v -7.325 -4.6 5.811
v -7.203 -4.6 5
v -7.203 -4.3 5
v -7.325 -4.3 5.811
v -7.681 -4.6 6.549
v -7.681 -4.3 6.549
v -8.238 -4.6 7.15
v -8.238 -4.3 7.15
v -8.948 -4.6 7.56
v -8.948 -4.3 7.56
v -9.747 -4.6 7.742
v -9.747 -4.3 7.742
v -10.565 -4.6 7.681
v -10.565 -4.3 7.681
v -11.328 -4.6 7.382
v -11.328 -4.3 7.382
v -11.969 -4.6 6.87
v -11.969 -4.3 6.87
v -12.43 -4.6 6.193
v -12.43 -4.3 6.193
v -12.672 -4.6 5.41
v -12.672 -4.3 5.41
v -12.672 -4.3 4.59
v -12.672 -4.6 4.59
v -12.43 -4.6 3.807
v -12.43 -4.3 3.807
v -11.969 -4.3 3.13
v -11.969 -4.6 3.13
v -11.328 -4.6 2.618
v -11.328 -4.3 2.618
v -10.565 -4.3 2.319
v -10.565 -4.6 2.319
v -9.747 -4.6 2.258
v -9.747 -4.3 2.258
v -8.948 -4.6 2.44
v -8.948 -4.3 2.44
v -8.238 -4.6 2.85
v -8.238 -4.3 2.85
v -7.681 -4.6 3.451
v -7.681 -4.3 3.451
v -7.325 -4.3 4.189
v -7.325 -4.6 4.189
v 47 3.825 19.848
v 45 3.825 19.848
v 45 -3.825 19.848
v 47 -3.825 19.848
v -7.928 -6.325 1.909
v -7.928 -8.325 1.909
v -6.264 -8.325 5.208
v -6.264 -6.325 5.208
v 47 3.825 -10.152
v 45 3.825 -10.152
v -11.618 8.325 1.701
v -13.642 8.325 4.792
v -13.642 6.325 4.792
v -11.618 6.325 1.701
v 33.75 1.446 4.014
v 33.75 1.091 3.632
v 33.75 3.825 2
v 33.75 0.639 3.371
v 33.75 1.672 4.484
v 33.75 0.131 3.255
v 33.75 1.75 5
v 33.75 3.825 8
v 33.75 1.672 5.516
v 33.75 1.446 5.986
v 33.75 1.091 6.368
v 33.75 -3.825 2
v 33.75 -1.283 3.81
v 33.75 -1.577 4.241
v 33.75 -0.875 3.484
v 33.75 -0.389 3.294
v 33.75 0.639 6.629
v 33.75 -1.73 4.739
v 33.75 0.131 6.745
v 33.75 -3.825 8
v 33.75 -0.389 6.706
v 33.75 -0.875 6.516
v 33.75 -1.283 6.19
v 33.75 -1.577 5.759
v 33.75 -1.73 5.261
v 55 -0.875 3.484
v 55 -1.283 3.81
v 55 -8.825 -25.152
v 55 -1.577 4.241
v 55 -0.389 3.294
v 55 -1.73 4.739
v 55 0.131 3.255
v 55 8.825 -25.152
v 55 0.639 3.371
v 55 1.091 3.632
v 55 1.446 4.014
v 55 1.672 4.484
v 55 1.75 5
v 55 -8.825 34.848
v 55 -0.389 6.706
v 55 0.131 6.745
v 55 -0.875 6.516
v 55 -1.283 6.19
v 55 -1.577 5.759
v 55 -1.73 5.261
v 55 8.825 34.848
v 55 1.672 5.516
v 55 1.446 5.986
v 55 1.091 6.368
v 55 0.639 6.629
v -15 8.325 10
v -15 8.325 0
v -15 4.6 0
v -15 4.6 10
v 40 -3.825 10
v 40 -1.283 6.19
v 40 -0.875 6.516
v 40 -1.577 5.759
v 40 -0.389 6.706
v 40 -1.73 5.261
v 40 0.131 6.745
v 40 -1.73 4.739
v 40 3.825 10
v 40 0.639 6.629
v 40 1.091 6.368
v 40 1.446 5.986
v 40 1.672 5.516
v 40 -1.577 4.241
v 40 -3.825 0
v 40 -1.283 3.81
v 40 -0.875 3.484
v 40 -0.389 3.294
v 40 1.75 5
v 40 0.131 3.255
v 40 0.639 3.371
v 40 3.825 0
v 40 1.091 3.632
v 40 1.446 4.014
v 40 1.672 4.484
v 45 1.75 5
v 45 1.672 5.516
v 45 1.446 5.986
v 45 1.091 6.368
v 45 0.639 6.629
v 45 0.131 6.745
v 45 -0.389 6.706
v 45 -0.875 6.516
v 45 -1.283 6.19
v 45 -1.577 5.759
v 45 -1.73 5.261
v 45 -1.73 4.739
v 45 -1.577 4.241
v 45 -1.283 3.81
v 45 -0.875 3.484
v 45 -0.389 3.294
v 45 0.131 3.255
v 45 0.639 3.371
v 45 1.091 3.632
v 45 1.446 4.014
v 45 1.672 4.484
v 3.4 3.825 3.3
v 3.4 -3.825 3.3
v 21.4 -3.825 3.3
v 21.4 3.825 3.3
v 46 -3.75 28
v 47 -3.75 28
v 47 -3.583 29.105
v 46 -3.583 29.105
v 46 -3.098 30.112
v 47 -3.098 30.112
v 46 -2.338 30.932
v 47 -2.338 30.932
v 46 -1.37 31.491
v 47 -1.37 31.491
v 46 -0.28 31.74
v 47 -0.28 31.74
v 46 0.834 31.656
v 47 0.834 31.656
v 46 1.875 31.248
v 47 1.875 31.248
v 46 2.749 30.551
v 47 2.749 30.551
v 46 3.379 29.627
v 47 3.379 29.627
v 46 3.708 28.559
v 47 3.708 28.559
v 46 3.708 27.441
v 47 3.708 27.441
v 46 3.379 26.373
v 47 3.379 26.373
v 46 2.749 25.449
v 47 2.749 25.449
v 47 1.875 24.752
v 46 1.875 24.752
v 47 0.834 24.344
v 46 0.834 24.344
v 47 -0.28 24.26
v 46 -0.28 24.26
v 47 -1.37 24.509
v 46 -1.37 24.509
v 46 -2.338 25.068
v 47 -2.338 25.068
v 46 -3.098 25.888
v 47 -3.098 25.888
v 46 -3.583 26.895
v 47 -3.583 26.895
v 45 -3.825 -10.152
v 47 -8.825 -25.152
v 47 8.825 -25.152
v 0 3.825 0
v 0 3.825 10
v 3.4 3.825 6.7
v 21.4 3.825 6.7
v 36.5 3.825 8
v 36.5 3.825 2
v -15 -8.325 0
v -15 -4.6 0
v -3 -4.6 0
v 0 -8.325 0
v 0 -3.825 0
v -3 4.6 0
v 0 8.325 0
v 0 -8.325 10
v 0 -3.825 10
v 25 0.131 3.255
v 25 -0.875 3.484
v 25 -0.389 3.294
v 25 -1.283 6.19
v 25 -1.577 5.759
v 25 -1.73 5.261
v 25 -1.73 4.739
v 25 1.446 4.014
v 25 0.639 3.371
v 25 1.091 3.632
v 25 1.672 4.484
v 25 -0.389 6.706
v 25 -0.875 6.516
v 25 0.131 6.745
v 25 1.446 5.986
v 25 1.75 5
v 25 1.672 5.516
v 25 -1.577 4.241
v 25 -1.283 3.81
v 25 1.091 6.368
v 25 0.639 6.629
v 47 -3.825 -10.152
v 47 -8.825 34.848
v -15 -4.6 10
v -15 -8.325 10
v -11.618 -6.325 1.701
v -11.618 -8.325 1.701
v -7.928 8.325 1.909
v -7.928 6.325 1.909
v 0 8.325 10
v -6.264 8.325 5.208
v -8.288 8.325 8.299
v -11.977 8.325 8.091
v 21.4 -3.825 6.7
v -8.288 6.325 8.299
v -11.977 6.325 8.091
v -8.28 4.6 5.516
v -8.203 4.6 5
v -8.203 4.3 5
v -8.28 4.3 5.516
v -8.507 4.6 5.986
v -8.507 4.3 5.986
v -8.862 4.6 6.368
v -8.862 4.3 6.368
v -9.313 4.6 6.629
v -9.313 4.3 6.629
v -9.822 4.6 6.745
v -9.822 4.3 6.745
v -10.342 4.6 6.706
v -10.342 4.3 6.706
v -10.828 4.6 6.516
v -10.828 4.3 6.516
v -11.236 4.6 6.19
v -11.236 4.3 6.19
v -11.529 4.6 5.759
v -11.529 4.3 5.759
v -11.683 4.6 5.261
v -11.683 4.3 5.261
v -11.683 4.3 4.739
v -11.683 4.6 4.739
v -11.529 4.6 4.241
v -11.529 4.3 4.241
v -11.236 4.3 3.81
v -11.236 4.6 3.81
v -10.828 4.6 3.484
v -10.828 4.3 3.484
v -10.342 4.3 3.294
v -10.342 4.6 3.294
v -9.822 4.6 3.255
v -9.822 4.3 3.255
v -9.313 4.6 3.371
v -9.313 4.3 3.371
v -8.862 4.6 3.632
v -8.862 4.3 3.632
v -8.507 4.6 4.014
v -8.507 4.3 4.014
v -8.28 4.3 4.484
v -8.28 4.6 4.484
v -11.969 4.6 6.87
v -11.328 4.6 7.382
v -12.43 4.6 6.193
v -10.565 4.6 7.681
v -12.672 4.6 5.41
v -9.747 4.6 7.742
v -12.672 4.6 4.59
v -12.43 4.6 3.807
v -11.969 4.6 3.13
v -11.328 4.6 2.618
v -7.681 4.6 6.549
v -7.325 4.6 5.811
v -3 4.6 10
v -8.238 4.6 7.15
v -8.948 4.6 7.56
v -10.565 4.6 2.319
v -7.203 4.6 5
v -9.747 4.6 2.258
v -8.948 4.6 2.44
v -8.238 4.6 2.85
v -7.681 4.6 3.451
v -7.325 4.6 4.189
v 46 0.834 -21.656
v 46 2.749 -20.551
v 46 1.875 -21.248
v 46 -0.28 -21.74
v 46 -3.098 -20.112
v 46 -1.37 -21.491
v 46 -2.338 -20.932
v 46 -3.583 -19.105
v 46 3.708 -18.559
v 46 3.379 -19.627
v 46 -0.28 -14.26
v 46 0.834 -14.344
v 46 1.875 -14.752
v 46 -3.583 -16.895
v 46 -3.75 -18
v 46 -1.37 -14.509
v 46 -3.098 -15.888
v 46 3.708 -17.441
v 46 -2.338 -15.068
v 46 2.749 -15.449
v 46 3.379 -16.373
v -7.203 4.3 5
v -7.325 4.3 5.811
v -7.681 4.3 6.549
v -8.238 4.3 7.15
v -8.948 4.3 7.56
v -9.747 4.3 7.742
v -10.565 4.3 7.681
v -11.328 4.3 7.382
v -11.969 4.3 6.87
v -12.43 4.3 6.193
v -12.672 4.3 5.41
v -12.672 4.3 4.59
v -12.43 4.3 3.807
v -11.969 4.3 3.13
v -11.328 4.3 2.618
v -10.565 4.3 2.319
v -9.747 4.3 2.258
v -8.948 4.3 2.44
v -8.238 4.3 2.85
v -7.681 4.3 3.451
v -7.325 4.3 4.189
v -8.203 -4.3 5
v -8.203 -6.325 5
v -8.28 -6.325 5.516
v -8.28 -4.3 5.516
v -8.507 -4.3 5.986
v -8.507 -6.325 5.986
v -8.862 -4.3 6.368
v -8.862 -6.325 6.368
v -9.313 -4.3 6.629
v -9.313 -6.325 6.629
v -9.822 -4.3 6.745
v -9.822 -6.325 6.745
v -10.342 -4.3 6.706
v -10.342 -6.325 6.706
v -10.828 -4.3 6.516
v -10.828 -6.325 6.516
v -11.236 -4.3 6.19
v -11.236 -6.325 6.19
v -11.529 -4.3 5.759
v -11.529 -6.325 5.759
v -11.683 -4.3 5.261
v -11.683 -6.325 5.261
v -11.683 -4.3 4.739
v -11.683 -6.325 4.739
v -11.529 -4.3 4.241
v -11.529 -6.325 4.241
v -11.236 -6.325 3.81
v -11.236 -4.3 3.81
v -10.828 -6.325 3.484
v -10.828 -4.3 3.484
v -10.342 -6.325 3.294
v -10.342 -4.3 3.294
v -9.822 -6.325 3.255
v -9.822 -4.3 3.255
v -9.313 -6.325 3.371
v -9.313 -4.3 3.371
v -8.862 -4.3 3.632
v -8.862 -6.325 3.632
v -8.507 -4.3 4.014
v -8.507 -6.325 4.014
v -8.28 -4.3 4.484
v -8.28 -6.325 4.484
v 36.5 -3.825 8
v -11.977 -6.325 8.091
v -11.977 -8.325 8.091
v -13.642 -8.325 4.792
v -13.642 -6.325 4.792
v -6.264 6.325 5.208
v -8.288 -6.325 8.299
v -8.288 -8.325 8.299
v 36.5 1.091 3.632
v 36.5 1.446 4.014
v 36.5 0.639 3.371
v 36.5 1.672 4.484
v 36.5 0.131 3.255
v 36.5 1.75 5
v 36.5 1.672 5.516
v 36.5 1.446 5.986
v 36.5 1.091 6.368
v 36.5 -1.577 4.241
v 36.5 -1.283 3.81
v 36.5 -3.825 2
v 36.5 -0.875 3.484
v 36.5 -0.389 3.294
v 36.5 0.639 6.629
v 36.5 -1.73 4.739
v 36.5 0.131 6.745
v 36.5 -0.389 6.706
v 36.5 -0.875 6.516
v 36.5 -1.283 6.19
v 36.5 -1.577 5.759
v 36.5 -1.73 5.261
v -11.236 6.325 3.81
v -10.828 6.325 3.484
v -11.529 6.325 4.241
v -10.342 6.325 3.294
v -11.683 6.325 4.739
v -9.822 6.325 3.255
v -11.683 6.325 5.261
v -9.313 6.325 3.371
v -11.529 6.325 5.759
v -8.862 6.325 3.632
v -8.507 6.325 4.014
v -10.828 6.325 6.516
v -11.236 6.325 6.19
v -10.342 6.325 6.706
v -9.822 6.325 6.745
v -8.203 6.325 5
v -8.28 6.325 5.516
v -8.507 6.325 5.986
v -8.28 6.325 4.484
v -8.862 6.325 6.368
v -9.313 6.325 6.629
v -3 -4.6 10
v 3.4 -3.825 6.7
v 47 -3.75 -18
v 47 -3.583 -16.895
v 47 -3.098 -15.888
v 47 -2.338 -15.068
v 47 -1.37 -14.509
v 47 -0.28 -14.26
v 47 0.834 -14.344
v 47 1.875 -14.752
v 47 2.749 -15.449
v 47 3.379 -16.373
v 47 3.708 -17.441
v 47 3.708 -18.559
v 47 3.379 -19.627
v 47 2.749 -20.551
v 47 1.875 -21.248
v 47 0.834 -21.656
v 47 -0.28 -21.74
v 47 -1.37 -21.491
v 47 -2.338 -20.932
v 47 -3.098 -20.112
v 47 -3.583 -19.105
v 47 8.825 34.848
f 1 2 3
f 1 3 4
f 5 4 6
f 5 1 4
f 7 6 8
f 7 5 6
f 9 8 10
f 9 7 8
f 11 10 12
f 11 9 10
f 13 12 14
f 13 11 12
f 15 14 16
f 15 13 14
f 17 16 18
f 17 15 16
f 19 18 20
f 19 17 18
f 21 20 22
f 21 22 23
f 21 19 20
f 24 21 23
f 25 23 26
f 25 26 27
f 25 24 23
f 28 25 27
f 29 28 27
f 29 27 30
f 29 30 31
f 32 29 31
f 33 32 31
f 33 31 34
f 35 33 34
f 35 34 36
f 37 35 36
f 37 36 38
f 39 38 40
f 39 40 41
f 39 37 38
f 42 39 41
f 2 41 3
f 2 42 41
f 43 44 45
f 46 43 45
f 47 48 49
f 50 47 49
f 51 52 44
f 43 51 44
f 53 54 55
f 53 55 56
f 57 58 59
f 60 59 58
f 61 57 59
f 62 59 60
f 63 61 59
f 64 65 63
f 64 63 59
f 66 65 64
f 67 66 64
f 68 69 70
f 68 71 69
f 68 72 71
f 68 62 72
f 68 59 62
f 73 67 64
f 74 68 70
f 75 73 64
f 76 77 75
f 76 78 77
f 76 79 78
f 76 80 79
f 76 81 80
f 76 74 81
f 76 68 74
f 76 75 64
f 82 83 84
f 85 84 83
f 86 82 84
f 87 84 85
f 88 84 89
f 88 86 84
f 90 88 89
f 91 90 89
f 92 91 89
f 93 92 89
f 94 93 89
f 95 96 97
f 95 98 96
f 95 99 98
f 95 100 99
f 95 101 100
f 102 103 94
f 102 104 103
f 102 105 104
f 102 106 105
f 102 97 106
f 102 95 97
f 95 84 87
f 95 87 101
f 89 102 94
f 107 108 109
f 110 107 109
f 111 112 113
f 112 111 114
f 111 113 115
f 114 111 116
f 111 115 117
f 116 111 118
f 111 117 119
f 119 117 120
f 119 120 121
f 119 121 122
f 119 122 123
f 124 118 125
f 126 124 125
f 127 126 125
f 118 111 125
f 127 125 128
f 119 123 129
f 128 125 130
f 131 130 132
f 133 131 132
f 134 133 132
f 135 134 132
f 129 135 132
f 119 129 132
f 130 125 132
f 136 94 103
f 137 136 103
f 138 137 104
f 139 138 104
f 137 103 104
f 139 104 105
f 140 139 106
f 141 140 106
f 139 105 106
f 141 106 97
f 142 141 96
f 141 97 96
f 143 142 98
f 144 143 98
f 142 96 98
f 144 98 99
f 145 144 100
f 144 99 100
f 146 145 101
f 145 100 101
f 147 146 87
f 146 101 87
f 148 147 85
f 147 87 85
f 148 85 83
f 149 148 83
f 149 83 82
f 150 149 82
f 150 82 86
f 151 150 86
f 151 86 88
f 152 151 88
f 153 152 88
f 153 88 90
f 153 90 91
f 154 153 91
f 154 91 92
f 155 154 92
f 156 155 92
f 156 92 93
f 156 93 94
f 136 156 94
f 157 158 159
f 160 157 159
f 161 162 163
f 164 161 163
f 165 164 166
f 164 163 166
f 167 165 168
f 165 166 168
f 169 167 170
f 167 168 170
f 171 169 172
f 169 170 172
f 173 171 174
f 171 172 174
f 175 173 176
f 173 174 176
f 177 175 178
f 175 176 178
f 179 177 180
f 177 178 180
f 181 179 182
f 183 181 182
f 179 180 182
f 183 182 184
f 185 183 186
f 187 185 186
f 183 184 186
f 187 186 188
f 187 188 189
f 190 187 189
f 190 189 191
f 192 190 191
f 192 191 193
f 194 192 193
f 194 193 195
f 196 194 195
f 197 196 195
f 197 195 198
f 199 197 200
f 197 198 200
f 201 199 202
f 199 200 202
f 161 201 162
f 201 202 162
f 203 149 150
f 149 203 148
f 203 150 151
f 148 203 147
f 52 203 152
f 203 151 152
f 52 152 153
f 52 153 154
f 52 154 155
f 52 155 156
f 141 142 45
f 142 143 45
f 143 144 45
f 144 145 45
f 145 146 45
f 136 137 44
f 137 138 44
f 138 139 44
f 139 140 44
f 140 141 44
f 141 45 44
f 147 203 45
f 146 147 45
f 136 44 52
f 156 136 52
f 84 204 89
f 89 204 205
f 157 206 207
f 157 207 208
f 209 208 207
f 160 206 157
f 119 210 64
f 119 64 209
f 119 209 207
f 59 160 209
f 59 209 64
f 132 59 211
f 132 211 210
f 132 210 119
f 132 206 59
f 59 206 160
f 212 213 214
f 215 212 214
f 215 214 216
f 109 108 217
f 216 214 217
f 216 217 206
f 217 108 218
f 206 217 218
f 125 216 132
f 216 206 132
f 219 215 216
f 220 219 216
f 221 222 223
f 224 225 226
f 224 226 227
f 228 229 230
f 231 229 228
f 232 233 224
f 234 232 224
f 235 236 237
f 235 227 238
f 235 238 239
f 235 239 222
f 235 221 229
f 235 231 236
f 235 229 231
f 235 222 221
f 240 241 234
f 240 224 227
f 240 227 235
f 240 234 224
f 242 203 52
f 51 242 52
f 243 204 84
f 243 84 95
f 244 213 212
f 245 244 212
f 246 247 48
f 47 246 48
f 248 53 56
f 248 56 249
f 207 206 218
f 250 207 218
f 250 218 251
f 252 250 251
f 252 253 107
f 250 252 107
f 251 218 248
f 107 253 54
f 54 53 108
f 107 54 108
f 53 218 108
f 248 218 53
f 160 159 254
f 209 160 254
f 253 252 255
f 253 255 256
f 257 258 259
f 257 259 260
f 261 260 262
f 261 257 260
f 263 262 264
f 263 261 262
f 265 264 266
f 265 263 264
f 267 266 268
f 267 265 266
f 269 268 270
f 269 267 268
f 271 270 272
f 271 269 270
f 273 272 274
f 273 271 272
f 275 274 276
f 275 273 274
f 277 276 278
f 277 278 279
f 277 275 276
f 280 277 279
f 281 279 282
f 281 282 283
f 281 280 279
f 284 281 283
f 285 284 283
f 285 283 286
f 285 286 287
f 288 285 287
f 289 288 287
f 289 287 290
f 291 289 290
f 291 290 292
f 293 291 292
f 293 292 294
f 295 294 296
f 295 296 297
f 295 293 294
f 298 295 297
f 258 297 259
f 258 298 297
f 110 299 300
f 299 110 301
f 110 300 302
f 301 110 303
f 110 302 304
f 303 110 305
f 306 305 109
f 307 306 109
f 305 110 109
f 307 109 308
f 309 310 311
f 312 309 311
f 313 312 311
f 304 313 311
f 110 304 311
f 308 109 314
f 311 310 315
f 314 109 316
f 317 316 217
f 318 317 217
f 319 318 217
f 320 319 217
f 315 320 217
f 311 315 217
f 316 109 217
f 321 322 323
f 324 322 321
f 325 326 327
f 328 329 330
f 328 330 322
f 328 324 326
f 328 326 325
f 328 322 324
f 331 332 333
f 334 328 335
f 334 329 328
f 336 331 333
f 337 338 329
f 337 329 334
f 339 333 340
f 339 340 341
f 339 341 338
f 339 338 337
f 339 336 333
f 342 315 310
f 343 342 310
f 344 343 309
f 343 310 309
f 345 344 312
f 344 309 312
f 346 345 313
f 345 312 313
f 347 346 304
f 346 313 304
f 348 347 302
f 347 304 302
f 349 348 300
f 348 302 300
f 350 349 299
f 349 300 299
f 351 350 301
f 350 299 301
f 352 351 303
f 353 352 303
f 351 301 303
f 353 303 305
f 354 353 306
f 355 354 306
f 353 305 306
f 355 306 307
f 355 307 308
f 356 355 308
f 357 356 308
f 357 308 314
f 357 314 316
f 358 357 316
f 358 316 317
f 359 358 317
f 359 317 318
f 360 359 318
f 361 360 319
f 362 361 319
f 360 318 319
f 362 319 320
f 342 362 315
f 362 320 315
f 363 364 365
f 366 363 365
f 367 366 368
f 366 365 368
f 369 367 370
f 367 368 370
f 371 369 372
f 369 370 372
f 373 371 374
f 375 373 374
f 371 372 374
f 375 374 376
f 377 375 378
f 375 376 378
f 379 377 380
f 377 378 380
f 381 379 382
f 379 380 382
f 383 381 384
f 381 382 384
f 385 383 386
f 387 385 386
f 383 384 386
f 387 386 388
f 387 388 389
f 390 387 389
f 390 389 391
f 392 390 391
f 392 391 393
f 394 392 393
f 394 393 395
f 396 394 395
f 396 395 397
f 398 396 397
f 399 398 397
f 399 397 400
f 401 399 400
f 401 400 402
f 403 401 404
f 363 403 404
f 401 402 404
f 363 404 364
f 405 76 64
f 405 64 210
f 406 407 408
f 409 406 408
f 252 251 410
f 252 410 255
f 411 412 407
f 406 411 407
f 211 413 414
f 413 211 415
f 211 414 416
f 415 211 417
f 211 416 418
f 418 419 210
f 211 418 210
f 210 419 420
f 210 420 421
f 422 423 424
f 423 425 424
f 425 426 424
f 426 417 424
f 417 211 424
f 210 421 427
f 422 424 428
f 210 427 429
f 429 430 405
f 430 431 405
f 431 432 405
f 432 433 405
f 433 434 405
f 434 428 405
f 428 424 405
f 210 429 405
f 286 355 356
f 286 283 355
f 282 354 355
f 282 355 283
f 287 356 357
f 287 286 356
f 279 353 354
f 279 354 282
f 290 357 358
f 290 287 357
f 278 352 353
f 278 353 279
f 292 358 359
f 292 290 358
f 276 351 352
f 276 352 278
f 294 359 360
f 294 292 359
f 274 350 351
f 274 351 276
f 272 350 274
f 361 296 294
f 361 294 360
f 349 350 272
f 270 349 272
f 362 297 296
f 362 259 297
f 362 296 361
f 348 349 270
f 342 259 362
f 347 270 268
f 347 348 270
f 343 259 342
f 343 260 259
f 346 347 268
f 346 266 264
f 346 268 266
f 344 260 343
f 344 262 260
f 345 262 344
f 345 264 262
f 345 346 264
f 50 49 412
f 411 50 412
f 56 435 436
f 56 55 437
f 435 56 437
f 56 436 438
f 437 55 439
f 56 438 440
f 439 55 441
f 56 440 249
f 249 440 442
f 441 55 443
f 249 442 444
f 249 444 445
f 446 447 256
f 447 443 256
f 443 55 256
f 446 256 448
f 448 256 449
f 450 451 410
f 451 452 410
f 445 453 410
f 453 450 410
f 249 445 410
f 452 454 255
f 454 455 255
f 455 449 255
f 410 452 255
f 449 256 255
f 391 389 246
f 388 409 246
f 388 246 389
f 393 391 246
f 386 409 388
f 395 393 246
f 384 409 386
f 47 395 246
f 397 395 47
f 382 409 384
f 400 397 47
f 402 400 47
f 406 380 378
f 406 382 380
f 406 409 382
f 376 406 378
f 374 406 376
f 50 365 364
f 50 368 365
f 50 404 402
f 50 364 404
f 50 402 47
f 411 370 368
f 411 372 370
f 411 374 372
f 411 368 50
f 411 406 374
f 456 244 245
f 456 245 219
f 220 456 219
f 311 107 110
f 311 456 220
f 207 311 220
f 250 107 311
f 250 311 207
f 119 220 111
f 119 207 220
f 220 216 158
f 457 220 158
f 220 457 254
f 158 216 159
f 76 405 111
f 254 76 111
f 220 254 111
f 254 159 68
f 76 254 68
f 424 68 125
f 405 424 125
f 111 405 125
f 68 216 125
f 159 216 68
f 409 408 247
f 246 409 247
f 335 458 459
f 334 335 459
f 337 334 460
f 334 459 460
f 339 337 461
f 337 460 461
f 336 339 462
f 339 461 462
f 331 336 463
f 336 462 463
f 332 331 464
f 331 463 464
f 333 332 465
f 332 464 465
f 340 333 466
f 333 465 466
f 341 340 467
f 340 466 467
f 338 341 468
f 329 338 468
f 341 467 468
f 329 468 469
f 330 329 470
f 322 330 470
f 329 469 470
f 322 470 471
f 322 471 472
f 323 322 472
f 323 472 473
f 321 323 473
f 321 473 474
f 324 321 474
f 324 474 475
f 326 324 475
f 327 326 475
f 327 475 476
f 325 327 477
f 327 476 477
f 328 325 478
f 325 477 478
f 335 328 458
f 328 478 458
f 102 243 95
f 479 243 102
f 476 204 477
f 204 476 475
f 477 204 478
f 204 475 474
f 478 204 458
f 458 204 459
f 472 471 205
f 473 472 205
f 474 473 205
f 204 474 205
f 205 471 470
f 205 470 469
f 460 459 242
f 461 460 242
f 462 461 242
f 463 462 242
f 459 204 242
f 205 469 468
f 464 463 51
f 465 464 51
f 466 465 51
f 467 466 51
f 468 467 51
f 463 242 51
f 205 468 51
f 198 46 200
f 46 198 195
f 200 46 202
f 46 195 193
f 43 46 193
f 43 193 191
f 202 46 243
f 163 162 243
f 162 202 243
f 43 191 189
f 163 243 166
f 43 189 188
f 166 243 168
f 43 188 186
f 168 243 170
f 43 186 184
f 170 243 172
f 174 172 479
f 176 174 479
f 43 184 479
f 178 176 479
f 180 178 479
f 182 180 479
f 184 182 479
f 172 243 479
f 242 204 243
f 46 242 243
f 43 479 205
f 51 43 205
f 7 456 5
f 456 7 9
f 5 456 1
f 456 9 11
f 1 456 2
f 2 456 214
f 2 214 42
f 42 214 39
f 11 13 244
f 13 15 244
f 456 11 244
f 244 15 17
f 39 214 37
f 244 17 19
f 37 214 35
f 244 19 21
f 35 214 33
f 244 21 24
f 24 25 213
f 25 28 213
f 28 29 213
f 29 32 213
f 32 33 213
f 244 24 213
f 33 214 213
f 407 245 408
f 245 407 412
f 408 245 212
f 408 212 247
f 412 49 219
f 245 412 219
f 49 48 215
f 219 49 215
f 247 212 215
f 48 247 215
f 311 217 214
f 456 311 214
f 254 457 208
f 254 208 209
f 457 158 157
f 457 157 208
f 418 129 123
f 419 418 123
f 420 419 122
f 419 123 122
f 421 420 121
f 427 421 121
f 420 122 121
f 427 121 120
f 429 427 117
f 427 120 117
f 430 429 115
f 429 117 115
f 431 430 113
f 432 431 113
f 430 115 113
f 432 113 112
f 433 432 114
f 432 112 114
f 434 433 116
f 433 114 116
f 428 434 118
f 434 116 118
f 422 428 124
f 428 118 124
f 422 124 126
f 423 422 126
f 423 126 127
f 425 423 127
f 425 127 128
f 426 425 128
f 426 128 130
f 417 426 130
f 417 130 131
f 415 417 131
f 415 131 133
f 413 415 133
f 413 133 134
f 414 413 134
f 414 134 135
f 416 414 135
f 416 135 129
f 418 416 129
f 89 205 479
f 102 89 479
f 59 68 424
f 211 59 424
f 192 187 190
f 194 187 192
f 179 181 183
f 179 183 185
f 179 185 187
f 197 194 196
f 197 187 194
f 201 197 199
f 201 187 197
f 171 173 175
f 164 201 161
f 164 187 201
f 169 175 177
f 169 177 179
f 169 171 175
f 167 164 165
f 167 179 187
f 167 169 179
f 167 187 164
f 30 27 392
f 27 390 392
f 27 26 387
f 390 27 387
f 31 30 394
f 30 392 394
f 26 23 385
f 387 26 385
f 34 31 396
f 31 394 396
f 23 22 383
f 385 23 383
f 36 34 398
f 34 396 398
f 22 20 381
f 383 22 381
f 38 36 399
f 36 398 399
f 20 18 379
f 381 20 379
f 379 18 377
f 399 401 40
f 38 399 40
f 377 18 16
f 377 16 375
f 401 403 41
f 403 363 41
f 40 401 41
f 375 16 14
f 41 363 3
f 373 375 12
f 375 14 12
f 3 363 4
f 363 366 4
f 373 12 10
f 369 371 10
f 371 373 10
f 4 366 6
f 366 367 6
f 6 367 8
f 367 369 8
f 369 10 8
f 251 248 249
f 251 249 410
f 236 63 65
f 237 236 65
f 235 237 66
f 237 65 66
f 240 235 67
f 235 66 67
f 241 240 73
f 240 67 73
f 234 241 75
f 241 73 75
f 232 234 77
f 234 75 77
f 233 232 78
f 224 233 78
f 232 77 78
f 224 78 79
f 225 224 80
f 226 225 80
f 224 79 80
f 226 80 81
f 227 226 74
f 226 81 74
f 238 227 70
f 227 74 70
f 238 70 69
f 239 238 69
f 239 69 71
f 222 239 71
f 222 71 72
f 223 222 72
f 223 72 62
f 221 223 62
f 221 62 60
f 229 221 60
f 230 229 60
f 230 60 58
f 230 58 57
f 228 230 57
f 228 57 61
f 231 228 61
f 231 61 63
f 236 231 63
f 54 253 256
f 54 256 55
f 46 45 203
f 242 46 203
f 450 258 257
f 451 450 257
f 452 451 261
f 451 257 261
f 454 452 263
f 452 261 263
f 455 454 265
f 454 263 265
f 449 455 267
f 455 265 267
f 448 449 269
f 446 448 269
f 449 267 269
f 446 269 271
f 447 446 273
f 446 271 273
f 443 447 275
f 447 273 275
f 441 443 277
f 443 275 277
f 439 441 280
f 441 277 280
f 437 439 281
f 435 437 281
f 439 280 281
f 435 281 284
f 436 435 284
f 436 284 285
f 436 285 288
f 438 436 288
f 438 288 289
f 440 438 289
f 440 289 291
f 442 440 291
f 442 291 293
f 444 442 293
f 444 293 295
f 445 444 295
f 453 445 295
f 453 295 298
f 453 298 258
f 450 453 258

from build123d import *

# Parameters (mm, degrees)
F0_W      = 40
F0_H      = 3.825
F1_DEPTH  = 10
F2_R      = 1.75
F3_DEPTH  = 16.651
F4_W      = 18
F4_H      = 3.4
F4_W_2    = 2.75
F4_H_2    = 6
F5_DEPTH  = 12.151
F6_R      = 1.75
F7_DEPTH  = 15
F10_DEPTH = 2
F11_W     = 17.65
F11_H     = 60
F12_DEPTH = 8
F13_R     = 1.75
F14_DEPTH = 70.001
F15_R     = 2.75
F15_R_2   = 1.75
F16_DEPTH = 0.3
F17_R     = 1.75
F18_DEPTH = 2
F19_R     = 3.75
F20_DEPTH = 1


# Not quite as in the source:
# - a pattern or mirror of a feature is missing from the dataset's text; its kind, count and spacing are read off the source's solid


with BuildPart() as f1:
    # F0 (on Top) → F1 (new body)
    with BuildSketch(Plane.XY):
        Polygon((0, -3.825), (0, 0), (-3, 0), (-3, -4.6), (-15, -4.6), (-15, -8.325), (0, -8.325), align=None)
        Polygon((-3, 0), (0, 0), (0, 3.825), (0, 8.325), (-15, 8.325), (-15, 4.6), (-3, 4.6), align=None)
        with Locations((20, 1.9125)):
            Rectangle(F0_W, F0_H)
        with Locations((20, -1.9125)):
            Rectangle(F0_W, F0_H)
    extrude(amount=F1_DEPTH)

    # F2 (on face) → F3 (cut, through all)
    with BuildSketch(Plane.XZ.offset(8.325)):
        with Locations((-9.9527407438, 5)):
            Circle(F2_R)
    extrude(amount=-F3_DEPTH, mode=Mode.SUBTRACT)

    # F4 (on face) → F5 (cut, through all)
    with BuildSketch(Plane.XZ.offset(3.825)):
        with Locations((12.4002694301, 5)):
            Rectangle(F4_W, F4_H)
        with Locations((35.125, 5)):
            Rectangle(F4_W_2, F4_H_2)
    extrude(amount=-F5_DEPTH, mode=Mode.SUBTRACT)

    # F6 (on face) → F7 (cut)
    with BuildSketch(Plane.YZ.offset(40)):
        with Locations((0, 5)):
            Circle(F6_R)
    extrude(amount=-F7_DEPTH, mode=Mode.SUBTRACT)

    # F15 (on face) → F16 (join)
    with BuildSketch(Plane.XZ.offset(-4.6)):
        with Locations((-9.9527407438, 5)):
            Circle(F15_R)
        with Locations((-9.9527407438, 5)):
            Circle(F15_R_2, mode=Mode.SUBTRACT)
    f16 = extrude(amount=F16_DEPTH)

    # F16_copies: F16 across plane
    add(f16.mirror(Plane(origin=(0, 0, 0), x_dir=(0, 0, -1), z_dir=(0, -1, 0))))

    # F17 (on face) → F18 (cut)
    with BuildSketch(Plane.XZ.offset(8.325)):
        Polygon((-7.9284293953, 1.9088033227), (-6.2635302189, 5.2075067143), (-8.2878415673, 8.2987033916), (-11.9770520922, 8.0911966773), (-13.6419512686, 4.7924932857), (-11.6176399202, 1.7012966084), align=None)
        with Locations((-9.9527407438, 5)):
            Circle(F17_R, mode=Mode.SUBTRACT)
    f18 = extrude(amount=-F18_DEPTH, mode=Mode.SUBTRACT)

    # F18_copies: F18 across plane
    add(f18.mirror(Plane.ZX), mode=Mode.SUBTRACT)


with BuildPart() as f10:
    # F9 (on offset) → F10 (new body)
    with BuildSketch(Plane.YZ.offset(45)):
        Polygon((3.825, 0), (3.825, 10), (3.825, 19.8484882712), (-3.825, 19.8484882712), (-3.825, 10), (-3.825, 0), (-3.825, -10.1515117288), (3.825, -10.1515117288), align=None)
    extrude(amount=F10_DEPTH)

    # F11 (on face) → F12 (join)
    with BuildSketch(Plane.YZ.offset(47)):
        with Locations((0, 4.8484882712)):
            Rectangle(F11_W, F11_H)
    extrude(amount=F12_DEPTH)

    # F13 (on face) → F14 (cut, through all)
    with BuildSketch(Plane.YZ.offset(55)):
        with Locations((0, 5)):
            Circle(F13_R)
    extrude(amount=-F14_DEPTH, mode=Mode.SUBTRACT)

    # F19 (on face) → F20 (join)
    with BuildSketch(Plane(origin=(47, 0, 0), x_dir=(0, -1, 0), z_dir=(-1, 0, 0))):
        with Locations((0, 28)):
            Circle(F19_R)
        with Locations((0, -18)):
            Circle(F19_R)
    extrude(amount=F20_DEPTH)


solid = Compound([f1.part, f10.part])
